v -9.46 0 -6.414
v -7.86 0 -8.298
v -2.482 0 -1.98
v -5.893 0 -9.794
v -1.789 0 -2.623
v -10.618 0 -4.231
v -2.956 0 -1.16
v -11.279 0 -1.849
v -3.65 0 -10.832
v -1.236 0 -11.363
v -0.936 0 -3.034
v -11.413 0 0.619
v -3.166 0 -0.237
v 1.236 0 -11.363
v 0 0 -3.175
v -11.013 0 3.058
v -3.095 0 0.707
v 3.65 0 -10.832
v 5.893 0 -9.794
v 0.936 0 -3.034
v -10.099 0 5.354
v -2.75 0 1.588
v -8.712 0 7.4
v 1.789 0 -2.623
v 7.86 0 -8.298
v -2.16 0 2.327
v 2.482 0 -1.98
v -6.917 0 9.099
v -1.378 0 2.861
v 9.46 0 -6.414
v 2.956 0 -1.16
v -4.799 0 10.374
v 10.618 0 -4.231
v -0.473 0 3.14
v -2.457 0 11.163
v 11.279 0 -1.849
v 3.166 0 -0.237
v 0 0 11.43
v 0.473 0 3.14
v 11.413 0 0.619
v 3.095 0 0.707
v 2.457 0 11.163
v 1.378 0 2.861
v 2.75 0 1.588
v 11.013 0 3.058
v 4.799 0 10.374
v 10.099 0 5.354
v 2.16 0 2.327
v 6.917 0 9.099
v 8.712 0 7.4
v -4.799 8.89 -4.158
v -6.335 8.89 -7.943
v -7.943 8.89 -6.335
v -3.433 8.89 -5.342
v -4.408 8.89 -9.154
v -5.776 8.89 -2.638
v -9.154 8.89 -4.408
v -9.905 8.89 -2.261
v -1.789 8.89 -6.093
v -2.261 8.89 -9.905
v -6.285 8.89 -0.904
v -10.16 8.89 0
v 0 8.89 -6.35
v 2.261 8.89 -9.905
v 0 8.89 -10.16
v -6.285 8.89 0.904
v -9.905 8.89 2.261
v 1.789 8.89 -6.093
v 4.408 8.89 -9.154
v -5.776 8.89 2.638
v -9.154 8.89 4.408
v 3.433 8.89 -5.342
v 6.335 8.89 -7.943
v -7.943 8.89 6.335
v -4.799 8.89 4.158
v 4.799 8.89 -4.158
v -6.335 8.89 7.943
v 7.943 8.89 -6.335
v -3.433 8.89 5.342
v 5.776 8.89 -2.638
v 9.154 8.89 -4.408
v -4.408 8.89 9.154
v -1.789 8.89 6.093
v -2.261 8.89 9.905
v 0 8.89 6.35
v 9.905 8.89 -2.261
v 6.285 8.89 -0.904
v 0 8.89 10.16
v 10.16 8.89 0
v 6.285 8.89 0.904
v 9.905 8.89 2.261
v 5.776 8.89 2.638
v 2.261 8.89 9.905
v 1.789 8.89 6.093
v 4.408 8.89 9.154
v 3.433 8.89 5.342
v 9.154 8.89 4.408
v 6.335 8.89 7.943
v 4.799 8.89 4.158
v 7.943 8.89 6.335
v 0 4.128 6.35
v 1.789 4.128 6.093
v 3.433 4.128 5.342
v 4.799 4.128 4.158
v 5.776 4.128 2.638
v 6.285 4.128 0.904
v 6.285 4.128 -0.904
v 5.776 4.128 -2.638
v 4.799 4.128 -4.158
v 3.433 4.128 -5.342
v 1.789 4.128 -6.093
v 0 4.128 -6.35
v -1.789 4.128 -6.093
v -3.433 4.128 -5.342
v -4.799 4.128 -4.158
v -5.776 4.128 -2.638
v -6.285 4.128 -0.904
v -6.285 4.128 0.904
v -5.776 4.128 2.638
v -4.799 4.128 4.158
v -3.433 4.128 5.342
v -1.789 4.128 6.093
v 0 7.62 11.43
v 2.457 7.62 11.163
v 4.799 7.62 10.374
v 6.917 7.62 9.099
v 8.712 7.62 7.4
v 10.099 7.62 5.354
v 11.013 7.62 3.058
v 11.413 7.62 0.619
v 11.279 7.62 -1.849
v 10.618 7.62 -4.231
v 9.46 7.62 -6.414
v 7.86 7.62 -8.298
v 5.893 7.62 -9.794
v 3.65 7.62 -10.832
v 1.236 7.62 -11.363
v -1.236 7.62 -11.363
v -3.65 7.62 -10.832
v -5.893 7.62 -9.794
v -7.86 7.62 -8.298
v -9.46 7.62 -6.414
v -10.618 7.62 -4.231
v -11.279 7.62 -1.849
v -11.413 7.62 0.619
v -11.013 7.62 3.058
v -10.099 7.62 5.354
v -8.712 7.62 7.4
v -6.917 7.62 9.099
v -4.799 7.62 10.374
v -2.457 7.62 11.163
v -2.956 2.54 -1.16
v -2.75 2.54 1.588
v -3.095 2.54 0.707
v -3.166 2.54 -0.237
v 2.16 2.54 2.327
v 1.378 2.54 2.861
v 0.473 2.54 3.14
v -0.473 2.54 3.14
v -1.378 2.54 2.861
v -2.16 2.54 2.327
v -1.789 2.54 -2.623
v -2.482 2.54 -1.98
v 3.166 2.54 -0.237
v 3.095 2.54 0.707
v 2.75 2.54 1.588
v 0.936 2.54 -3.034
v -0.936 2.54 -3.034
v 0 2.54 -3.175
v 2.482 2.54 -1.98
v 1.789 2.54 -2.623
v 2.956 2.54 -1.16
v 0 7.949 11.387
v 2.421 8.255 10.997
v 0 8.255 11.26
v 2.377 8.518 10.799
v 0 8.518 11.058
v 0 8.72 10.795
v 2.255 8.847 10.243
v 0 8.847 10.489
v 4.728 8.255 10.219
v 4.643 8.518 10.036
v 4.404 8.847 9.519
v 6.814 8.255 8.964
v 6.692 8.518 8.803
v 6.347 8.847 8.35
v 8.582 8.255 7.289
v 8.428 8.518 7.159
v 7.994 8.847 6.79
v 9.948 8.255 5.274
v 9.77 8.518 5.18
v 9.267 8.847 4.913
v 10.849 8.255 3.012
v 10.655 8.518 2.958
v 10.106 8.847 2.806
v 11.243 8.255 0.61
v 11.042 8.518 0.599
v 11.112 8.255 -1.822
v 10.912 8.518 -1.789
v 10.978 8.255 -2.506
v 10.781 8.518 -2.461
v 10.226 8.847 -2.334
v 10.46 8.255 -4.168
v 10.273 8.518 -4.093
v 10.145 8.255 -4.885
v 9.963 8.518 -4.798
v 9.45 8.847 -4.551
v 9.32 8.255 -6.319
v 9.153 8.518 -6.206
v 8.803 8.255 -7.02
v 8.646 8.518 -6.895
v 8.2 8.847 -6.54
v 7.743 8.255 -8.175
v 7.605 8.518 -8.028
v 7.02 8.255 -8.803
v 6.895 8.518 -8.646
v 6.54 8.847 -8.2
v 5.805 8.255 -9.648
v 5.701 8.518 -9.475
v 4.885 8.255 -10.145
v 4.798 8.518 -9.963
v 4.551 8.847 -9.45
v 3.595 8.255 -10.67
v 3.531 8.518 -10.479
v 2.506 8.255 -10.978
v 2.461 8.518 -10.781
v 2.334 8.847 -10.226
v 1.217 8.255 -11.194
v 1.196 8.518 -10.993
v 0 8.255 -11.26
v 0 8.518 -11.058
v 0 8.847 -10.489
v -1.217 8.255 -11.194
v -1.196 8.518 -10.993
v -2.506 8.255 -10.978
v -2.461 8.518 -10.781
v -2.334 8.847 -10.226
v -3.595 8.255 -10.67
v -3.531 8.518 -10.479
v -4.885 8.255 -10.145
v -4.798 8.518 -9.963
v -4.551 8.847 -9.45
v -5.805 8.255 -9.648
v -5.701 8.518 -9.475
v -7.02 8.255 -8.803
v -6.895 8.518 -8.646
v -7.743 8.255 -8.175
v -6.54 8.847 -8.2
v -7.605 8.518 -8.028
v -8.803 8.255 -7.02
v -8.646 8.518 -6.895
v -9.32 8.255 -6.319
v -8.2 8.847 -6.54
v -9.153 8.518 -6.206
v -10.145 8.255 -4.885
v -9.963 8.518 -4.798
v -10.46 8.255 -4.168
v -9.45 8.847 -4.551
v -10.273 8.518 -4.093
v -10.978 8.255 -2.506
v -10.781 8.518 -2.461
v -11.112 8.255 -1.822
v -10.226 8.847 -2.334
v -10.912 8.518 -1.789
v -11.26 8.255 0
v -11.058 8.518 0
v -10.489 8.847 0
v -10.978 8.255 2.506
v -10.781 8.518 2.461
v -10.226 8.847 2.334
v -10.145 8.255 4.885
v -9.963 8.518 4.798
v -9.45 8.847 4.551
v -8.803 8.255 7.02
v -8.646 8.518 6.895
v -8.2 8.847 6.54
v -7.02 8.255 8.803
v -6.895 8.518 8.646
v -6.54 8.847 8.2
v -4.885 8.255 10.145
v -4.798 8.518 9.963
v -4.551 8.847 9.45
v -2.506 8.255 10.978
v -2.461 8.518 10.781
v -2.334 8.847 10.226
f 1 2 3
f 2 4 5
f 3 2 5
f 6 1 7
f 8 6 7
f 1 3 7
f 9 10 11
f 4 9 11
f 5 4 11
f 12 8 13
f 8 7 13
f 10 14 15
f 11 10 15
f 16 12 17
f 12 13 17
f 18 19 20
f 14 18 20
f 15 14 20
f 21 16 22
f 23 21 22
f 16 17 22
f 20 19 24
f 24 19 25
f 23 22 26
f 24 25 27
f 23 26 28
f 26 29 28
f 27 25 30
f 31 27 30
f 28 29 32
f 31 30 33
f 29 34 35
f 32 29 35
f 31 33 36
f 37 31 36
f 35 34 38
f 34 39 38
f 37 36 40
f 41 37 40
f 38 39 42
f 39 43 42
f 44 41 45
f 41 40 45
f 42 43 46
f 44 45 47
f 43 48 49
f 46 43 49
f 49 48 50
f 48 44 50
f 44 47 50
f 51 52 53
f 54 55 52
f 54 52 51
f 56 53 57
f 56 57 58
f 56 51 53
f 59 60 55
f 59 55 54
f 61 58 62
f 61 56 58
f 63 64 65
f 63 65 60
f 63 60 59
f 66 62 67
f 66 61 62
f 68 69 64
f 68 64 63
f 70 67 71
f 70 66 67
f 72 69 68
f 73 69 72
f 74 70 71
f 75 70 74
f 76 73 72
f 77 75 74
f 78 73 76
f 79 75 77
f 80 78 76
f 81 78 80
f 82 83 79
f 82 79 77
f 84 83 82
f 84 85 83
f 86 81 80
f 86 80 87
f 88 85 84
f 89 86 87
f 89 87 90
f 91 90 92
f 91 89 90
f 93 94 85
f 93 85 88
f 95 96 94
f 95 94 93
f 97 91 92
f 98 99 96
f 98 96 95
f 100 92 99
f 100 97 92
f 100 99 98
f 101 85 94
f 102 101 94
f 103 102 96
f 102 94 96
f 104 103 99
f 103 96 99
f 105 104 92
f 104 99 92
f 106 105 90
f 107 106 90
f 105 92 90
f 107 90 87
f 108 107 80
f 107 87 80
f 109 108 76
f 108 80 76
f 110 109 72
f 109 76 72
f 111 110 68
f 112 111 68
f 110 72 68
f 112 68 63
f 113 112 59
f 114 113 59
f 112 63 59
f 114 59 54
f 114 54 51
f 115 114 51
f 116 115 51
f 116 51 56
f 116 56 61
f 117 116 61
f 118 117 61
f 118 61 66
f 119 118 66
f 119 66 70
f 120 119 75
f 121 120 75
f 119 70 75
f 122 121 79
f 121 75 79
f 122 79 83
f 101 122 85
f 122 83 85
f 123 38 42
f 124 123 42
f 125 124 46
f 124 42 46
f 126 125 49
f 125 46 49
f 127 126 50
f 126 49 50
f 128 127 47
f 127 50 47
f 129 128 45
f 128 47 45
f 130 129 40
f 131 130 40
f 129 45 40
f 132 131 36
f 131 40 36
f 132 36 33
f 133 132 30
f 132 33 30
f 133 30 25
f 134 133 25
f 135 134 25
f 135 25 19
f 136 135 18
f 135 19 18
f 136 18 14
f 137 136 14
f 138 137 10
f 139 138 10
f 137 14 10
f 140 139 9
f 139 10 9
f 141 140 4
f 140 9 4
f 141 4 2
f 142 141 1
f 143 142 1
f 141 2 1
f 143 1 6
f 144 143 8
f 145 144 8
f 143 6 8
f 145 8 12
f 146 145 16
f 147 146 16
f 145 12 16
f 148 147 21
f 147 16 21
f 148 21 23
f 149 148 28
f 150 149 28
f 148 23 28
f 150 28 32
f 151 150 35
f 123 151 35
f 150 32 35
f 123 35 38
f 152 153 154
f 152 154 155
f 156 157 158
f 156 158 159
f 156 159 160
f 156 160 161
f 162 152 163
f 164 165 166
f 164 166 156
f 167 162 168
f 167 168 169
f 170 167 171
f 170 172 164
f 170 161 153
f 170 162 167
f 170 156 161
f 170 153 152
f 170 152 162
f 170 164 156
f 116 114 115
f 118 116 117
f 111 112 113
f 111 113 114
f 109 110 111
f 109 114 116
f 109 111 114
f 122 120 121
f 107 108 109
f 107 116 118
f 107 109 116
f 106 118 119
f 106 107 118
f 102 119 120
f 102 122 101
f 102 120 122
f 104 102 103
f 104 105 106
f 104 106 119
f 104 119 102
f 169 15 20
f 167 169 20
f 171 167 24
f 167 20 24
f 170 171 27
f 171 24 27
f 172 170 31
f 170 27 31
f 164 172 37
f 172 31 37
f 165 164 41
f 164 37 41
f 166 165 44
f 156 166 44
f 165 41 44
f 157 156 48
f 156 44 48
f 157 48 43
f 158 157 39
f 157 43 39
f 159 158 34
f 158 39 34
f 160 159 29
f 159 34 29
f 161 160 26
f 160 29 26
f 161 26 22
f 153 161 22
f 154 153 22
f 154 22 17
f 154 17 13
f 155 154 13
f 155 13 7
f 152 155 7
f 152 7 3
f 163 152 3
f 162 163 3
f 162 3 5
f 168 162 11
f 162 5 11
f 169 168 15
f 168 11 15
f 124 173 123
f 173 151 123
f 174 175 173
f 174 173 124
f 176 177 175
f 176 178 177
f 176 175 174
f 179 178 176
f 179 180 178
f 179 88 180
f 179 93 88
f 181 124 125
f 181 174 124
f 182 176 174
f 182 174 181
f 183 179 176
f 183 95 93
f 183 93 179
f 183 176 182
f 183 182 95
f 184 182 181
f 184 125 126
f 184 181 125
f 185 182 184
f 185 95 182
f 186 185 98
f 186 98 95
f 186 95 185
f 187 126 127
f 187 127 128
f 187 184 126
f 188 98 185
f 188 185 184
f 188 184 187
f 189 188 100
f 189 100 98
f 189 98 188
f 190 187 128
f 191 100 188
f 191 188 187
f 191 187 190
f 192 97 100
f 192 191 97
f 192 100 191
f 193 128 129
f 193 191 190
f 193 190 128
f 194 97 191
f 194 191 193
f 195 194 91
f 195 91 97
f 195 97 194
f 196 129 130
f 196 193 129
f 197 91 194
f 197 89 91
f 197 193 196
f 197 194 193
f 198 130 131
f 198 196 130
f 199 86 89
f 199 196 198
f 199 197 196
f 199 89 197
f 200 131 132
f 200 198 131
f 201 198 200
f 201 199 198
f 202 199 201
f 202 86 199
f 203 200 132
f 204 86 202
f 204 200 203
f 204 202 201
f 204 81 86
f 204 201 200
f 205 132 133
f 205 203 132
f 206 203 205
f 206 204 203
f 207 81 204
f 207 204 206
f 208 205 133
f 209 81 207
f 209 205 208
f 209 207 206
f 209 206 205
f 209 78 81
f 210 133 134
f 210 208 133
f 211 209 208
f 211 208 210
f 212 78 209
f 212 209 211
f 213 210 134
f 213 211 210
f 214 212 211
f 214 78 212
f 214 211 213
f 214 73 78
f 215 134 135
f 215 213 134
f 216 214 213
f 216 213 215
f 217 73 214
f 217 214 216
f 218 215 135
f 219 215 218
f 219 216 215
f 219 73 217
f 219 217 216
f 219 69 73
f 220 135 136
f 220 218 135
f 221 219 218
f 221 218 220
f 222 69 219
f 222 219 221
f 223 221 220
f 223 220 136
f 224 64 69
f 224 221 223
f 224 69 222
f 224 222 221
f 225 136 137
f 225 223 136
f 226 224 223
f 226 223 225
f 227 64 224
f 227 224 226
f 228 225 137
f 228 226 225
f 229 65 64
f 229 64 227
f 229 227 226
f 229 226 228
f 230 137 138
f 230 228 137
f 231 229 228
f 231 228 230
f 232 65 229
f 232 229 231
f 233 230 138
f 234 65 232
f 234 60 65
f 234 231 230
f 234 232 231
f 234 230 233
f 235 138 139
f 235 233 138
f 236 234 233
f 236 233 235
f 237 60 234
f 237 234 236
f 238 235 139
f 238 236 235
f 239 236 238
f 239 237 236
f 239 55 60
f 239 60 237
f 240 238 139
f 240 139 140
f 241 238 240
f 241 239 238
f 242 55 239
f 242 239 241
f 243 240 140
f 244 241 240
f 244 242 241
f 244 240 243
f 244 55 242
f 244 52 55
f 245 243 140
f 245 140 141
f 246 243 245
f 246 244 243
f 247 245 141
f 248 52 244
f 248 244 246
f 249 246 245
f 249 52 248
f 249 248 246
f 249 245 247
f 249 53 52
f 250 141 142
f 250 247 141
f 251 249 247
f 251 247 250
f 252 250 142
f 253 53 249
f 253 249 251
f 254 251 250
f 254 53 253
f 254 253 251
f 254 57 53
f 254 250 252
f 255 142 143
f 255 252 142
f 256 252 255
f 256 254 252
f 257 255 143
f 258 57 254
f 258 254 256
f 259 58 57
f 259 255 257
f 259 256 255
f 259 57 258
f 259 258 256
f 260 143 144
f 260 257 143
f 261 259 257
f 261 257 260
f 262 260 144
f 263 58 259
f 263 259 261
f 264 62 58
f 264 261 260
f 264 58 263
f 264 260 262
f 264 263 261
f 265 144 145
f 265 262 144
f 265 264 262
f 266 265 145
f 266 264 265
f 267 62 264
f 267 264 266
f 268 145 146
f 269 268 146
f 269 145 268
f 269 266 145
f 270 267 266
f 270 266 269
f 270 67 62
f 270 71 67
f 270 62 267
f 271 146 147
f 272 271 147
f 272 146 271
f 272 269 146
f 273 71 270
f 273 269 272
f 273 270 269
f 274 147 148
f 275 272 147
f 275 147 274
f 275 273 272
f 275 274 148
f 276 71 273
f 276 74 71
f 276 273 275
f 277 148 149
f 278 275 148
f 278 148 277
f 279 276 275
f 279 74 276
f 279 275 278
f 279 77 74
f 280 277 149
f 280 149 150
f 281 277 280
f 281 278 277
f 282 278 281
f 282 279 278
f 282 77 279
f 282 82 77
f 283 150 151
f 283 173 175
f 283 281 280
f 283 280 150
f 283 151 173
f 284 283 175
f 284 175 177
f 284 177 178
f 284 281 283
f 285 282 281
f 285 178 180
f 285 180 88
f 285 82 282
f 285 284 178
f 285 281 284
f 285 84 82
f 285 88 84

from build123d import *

# Parameters (mm, degrees)
SKETCH1_R           = 11.43
BOSS_EXTRUDE1_DEPTH = 8.89
SKETCH2_R           = 6.35
CUT_EXTRUDE1_DEPTH  = 4.7625
FILLET4_R           = 1.27
SKETCH3_R           = 3.175
CUT_EXTRUDE2_DEPTH  = 2.54


with BuildPart() as part:
    # Sketch1 → Boss-Extrude1 (new body)
    with BuildSketch(Plane(origin=(0, 0, 0), x_dir=(1, 0, 0), z_dir=(0, 1, 0))):
        Circle(SKETCH1_R)
    extrude(amount=BOSS_EXTRUDE1_DEPTH)

    # Sketch2 → Cut-Extrude1 (cut)
    with BuildSketch(Plane(origin=(0, 8.89, 0), x_dir=(1, 0, 0), z_dir=(0, 1, 0))):
        Circle(SKETCH2_R)
    extrude(amount=-CUT_EXTRUDE1_DEPTH, mode=Mode.SUBTRACT)

    # Fillet4
    fillet4_edges = [part.edges().sort_by_distance(p)[0] for p in [
        (-11.43, 8.89, 0),
    ]]
    fillet(fillet4_edges, radius=FILLET4_R)

    # Sketch3 → Cut-Extrude2 (cut)
    with BuildSketch(Plane.XZ):
        Circle(SKETCH3_R)
    extrude(amount=-CUT_EXTRUDE2_DEPTH, mode=Mode.SUBTRACT)


solid = part.part
